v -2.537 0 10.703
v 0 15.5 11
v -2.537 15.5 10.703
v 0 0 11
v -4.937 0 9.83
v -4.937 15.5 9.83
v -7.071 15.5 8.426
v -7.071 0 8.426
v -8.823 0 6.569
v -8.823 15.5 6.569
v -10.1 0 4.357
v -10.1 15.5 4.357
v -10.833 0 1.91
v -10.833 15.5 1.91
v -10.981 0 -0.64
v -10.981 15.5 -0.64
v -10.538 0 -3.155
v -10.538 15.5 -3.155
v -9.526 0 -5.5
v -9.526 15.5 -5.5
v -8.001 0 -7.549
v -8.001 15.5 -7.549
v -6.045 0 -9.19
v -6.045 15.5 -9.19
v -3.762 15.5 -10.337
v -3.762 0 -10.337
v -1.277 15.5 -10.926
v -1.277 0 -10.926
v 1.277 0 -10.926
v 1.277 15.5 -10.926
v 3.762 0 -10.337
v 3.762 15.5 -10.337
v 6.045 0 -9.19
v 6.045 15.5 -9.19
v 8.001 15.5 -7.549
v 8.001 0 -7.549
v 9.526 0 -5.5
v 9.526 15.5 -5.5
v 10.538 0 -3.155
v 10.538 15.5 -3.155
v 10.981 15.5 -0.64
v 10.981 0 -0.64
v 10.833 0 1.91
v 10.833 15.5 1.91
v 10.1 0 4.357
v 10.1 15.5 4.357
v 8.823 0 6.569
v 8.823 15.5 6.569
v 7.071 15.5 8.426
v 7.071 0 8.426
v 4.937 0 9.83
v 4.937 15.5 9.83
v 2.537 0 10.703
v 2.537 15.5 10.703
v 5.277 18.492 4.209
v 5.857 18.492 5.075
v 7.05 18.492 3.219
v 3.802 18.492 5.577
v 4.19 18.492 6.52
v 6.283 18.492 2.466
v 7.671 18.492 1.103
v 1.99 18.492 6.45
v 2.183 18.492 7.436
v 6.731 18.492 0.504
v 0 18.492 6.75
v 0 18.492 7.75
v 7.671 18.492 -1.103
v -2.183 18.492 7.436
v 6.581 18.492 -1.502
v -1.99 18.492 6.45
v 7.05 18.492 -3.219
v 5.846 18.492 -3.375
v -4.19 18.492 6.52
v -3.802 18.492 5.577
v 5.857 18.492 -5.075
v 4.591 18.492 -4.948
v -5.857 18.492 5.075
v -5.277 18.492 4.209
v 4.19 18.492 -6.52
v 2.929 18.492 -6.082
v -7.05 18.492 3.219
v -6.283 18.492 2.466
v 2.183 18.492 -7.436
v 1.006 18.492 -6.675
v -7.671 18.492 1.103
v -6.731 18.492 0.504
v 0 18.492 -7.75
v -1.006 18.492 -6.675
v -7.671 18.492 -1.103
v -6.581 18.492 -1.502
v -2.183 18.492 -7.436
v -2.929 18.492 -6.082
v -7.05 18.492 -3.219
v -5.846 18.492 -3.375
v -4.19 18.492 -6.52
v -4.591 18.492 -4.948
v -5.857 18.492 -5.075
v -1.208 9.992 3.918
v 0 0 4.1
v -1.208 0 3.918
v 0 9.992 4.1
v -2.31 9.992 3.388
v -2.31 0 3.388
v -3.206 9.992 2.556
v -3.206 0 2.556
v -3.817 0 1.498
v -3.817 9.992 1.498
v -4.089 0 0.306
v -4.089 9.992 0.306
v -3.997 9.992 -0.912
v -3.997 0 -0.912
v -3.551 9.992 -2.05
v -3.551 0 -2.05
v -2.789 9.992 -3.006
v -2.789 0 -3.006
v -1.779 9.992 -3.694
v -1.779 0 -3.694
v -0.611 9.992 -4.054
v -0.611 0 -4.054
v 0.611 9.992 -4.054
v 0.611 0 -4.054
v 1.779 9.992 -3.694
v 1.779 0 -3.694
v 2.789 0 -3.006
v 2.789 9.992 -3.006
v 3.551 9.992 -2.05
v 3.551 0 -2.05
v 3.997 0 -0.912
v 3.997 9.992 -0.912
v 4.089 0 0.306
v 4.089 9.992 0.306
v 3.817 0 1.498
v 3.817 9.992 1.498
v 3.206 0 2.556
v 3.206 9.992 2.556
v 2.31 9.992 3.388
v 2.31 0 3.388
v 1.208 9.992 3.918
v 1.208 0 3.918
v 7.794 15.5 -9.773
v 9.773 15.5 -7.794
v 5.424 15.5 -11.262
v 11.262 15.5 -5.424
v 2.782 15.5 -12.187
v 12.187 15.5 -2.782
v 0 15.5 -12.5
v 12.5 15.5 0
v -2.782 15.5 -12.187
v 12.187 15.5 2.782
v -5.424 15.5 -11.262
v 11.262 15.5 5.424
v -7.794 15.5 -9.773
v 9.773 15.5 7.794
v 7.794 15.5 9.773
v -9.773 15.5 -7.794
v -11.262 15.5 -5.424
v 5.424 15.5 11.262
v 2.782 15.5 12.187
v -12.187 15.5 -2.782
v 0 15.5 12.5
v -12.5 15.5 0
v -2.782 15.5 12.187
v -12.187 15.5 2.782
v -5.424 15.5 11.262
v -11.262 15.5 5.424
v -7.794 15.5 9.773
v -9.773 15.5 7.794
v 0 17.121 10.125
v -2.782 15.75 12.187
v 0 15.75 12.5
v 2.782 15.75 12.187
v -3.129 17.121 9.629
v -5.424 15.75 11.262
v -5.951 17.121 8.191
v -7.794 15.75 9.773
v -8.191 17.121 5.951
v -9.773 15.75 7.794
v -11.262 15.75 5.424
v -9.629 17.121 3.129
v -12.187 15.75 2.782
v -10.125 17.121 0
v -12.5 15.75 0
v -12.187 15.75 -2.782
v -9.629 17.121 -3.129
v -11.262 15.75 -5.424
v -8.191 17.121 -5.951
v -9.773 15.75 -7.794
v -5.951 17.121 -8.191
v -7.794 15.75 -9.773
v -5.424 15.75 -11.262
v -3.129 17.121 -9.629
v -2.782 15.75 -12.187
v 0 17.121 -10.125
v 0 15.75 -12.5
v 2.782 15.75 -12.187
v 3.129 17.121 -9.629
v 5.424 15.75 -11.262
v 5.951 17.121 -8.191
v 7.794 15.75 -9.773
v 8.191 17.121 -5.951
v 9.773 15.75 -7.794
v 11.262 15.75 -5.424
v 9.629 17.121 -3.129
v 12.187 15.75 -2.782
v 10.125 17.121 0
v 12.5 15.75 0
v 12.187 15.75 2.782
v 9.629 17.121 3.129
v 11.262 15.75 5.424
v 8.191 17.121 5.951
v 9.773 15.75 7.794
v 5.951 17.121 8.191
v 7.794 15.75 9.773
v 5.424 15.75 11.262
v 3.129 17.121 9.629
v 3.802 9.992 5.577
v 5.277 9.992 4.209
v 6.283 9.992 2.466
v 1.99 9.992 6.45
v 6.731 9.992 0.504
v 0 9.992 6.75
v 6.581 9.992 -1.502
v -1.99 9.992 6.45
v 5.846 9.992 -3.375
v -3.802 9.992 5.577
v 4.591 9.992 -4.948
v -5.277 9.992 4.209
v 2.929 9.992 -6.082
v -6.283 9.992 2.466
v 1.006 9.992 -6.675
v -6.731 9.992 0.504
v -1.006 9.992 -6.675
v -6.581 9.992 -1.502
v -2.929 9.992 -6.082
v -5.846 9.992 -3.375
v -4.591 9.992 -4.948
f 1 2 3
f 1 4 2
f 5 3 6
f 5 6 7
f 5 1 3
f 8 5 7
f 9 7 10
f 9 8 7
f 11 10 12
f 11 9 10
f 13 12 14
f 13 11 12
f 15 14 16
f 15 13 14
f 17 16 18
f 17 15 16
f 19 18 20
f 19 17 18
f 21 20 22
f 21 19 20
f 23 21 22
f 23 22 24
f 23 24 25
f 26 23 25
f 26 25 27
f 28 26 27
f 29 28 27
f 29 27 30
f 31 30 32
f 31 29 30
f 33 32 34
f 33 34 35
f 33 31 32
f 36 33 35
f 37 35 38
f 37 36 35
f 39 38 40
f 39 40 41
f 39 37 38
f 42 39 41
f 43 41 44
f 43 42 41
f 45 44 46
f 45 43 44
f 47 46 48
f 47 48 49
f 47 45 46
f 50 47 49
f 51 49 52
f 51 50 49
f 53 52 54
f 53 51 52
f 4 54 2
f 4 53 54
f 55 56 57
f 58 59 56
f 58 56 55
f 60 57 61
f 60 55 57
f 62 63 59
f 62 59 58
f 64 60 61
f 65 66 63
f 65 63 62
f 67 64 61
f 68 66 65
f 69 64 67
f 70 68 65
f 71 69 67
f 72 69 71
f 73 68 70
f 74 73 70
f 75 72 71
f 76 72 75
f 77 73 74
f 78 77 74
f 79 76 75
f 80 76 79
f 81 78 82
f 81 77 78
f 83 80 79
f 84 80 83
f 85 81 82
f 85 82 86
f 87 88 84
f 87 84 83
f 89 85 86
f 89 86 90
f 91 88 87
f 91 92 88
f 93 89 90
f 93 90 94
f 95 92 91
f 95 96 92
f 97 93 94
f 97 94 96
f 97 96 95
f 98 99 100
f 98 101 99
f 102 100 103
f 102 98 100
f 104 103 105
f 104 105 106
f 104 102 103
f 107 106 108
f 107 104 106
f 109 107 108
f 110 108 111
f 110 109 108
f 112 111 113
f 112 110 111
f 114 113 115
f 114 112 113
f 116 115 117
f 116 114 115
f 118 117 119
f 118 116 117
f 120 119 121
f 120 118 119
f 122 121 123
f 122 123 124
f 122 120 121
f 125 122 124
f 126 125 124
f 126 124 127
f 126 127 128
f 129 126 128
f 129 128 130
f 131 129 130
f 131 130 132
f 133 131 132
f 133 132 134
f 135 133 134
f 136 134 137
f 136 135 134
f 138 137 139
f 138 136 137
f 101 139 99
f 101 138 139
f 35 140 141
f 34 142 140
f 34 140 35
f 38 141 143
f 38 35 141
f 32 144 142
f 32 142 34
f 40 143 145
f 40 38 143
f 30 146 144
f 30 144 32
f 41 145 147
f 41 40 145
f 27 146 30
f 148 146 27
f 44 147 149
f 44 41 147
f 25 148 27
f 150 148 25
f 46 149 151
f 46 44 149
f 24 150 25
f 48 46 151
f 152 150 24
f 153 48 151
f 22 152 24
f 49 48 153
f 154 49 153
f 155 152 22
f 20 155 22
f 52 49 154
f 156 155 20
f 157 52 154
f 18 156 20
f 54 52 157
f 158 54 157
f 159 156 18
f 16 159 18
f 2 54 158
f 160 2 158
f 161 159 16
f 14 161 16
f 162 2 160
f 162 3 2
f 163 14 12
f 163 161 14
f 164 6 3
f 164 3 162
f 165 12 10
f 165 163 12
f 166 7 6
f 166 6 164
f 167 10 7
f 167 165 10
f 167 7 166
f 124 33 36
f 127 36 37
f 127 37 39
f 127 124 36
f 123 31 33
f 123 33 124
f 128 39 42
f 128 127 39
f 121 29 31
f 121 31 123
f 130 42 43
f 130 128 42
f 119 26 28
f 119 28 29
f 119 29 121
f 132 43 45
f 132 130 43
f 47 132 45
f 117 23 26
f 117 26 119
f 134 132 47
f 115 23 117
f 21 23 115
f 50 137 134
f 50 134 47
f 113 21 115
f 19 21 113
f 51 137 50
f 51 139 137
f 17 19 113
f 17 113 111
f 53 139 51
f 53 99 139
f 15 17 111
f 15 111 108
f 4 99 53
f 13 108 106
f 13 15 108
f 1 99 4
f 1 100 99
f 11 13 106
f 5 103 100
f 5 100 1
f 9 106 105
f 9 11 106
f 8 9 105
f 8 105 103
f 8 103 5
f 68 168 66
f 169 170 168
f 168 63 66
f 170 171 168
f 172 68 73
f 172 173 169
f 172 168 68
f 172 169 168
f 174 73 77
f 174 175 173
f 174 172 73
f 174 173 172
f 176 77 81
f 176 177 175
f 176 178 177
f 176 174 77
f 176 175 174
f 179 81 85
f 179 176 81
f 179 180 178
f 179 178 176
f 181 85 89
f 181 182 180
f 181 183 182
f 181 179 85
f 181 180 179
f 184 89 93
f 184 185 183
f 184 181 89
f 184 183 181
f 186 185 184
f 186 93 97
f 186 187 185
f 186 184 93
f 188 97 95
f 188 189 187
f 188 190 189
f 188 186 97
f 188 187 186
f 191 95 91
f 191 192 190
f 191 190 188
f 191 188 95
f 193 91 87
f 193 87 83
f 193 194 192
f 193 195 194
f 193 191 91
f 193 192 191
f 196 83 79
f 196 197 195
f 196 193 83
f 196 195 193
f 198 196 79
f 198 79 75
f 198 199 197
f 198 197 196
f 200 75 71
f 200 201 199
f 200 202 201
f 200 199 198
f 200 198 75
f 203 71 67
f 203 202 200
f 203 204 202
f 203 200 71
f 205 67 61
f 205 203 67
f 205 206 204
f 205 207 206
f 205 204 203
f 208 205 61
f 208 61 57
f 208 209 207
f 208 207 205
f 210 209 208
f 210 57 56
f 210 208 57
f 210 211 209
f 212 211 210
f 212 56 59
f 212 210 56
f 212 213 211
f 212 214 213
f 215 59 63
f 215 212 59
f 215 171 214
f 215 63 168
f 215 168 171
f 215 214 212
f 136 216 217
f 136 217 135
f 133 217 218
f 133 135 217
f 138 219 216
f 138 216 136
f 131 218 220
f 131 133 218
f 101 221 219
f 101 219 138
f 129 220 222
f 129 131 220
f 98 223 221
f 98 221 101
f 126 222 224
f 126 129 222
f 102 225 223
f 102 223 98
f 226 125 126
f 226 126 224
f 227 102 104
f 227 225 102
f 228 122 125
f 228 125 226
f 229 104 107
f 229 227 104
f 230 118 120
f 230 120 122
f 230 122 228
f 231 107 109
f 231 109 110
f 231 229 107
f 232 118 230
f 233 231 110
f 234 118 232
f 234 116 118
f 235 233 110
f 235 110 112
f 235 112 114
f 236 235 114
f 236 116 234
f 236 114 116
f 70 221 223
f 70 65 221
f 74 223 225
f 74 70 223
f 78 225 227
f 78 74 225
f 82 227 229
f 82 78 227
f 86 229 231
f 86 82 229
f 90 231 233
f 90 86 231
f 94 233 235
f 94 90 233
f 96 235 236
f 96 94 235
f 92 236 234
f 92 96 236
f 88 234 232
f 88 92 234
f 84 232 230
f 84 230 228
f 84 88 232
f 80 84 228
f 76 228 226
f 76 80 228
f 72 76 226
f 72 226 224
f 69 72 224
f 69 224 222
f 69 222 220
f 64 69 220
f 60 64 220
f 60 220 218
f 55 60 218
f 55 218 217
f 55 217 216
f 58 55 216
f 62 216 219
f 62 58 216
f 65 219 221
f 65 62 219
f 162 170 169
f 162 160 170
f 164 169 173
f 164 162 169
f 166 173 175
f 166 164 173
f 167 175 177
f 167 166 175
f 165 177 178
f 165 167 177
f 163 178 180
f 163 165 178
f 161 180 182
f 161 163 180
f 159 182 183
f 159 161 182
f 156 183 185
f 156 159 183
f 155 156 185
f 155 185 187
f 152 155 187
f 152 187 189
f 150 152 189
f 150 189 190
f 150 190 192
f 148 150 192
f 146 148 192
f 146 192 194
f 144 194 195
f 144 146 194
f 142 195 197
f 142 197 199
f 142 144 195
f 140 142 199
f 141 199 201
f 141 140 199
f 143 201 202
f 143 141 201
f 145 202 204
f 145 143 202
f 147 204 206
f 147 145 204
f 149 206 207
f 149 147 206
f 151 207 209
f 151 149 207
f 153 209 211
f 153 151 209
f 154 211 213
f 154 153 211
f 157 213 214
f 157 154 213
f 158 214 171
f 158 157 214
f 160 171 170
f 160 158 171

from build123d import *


with BuildPart() as part:
    # Esquisse1 → Révolution1 (revolve)
    with BuildSketch(Plane.XY, mode=Mode.PRIVATE) as r_volution1_sk:
        Polygon((4.1, 0), (4.1, 9.992413779), (6.75, 9.992413779), (6.75, 18.492413779), (7.75, 18.492413779), (12.5, 15.75), (12.5, 15.5), (11, 15.5), (11, 0), align=None)
    revolve(r_volution1_sk.sketch.rotate(Axis((0, 10.730531249, 0), (0, -1, 0)), 90), axis=Axis((0, 10.730531249, 0), (0, -1, 0)))  # turned: the seam where the file's is


solid = part.part
